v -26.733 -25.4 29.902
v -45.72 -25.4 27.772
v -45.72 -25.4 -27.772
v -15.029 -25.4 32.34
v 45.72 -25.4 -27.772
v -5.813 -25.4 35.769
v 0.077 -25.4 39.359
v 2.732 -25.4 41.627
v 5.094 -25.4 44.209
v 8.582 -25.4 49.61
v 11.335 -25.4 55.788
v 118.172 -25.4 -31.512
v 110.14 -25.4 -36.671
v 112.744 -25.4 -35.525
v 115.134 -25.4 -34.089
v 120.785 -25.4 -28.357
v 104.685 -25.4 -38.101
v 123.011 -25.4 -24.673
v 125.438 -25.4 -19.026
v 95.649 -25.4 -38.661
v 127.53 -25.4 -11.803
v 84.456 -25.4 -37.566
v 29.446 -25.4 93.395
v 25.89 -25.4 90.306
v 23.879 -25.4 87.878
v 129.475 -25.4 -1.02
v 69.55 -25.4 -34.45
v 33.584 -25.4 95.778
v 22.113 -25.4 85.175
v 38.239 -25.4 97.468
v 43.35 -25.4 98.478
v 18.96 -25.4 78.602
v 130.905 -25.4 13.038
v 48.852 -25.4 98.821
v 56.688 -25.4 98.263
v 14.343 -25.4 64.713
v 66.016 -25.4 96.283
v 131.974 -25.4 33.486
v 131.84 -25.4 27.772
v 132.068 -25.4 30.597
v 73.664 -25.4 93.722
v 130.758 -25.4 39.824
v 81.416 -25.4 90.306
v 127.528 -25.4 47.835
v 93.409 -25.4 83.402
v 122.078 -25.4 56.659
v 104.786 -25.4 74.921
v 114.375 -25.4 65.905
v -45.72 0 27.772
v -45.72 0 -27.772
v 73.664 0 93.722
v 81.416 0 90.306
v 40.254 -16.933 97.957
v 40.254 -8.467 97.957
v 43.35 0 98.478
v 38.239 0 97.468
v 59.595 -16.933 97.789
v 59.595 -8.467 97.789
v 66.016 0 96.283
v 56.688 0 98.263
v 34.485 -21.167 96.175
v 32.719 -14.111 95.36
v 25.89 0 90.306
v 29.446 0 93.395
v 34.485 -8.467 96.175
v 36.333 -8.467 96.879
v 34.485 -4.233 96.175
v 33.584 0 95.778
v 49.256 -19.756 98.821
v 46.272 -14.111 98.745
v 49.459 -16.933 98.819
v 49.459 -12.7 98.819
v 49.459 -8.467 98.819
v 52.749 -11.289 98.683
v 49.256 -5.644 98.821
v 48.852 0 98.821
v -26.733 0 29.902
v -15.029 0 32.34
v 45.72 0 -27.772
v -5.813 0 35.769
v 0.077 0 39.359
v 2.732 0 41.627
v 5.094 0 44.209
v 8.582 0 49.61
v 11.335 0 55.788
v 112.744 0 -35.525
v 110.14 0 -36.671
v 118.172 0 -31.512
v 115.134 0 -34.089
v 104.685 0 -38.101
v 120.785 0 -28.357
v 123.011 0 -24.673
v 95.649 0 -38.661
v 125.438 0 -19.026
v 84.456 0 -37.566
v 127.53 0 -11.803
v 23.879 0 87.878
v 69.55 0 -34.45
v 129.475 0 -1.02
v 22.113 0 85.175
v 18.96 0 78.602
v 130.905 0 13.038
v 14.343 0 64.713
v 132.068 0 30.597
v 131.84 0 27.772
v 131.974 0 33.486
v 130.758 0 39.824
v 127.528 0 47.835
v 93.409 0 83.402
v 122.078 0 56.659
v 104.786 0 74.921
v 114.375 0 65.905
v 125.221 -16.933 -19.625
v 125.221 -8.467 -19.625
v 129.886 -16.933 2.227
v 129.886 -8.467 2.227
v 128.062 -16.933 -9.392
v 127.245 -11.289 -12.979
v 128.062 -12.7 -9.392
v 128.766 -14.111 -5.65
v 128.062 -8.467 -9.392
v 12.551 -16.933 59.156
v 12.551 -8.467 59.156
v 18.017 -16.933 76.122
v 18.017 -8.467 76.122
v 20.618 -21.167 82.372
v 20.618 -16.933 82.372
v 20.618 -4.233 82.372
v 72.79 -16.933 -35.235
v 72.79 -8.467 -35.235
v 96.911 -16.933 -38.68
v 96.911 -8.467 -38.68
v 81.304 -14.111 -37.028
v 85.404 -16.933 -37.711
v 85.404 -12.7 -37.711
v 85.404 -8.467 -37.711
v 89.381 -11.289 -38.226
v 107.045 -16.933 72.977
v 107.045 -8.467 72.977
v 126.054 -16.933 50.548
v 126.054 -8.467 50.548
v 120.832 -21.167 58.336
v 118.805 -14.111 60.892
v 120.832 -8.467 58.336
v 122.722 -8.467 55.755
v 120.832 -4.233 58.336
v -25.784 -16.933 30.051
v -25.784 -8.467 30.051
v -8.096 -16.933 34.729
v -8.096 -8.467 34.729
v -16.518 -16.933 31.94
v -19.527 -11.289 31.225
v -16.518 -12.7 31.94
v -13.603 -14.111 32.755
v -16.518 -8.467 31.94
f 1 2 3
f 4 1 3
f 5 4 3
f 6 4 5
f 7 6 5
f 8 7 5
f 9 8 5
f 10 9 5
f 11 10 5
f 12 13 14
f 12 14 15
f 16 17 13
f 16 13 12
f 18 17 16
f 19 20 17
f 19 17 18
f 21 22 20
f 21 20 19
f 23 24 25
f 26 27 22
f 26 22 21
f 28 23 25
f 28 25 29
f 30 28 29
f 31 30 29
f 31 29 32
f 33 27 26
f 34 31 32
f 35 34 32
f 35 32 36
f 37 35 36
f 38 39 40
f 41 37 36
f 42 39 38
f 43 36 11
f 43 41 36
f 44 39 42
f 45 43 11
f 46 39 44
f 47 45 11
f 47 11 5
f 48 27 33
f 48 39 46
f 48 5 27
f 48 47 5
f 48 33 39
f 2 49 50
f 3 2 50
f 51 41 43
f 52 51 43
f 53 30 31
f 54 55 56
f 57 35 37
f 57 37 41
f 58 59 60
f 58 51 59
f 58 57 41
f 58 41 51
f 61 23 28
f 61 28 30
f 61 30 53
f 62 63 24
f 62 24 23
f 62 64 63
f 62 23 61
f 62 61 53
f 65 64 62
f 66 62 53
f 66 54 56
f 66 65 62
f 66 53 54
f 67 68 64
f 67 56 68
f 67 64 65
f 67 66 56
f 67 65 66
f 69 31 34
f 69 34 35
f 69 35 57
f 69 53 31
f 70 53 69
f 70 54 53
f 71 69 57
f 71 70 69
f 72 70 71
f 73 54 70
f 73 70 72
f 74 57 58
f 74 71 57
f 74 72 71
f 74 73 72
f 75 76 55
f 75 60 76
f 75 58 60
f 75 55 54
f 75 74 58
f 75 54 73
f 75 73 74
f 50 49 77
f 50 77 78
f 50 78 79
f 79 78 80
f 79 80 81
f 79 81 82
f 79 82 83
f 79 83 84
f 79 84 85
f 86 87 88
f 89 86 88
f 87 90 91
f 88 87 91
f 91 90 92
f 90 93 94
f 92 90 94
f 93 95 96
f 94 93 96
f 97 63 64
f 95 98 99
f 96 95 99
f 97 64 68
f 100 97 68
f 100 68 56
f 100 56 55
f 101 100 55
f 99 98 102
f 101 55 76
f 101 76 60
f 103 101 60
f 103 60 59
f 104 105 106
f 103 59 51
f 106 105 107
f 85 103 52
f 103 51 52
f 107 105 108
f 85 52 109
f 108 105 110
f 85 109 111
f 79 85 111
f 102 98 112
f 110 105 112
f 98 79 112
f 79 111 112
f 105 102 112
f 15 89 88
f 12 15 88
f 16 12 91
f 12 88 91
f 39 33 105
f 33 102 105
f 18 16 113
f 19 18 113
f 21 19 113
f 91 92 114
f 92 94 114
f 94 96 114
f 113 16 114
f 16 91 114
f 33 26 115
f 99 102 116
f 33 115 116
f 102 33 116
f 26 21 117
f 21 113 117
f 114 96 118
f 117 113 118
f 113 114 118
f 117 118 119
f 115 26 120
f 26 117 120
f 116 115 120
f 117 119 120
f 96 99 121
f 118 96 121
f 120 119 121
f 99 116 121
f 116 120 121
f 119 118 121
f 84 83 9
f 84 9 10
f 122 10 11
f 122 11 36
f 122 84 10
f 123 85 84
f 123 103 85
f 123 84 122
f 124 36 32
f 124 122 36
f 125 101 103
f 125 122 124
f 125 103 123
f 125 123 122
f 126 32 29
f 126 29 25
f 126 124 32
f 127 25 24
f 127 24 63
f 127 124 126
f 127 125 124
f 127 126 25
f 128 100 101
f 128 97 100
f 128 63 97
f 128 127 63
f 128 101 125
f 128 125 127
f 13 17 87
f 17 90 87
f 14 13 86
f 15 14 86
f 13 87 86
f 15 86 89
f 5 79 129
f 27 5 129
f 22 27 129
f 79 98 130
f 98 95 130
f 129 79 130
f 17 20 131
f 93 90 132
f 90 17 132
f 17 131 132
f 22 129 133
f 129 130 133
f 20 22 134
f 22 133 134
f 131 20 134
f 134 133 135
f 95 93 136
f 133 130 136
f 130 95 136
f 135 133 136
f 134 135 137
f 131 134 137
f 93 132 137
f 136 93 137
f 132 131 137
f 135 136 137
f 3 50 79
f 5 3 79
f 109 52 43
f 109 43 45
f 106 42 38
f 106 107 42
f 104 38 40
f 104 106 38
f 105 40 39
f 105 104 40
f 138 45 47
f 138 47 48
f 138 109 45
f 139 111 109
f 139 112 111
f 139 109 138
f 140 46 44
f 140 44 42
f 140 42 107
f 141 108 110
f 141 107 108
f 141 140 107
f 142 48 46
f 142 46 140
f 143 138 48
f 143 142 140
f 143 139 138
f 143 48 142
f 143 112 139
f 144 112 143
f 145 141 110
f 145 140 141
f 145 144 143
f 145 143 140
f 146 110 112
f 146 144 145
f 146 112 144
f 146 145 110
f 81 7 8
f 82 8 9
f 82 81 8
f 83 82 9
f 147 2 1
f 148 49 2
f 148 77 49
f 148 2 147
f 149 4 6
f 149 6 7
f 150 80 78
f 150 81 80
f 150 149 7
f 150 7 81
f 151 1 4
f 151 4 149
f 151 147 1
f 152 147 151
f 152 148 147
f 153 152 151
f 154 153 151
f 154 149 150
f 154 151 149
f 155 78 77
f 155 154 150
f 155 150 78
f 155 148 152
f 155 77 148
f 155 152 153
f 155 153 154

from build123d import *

# Parameters (mm, degrees)
F0_W     = 55.5266755181
F0_H     = 46.0978470142
F1_DEPTH = 25.4


with BuildPart() as f1:
    # F0 (on Front) → F1 (new body)
    with BuildSketch(Plane.XZ):
        Polygon((-45.72, 27.7720657421), (-45.72, -27.7720657421), (45.72, -27.7720657421), (45.72, 2.3720657421), (45.72, 27.7720657421), align=None)
        with BuildLine():
            Line((45.72, 2.3720657421), (45.72, -27.7720657421))
            add(Edge.make_bspline(
                [(131.83991611, 27.7720657421), (128.4226083131, 3.6394915706), (87.0713041565, -12.0662870858), (45.72, -27.7720657421)],
                knots=[0.7528337274, 0.7528337274, 0.7528337274, 0.7528337274, 1, 1, 1, 1], degree=3))
            add(Edge.make_bspline(
                [(81.4163490426, 90.3064464871), (108.1552290461, 77.110332117), (134.8655063082, 49.1383822136), (131.83991611, 27.7720657421)],
                knots=[0.5339995176, 0.5339995176, 0.5339995176, 0.5339995176, 0.7528337274, 0.7528337274, 0.7528337274, 0.7528337274], degree=3))
            Line((81.4163490426, 90.3064464871), (104.9052251901, 53.874658511))
            ThreePointArc((104.9052251901, 53.874658511), (101.4010974206, 18.9161297578), (70.4063948109, 2.3720657421))
            Line((70.4063948109, 2.3720657421), (45.72, 2.3720657421))
        make_face()
        with BuildLine():
            add(Edge.make_bspline(
                [(131.83991611, 27.7720657421), (128.4226083131, 3.6394915706), (87.0713041565, -12.0662870858), (45.72, -27.7720657421)],
                knots=[0.7528337274, 0.7528337274, 0.7528337274, 0.7528337274, 1, 1, 1, 1], degree=3))
            add(Edge.make_bspline(
                [(45.72, -27.7720657421), (73.2817283043, -35.9046962959), (100.8434566087, -44.0373268496), (115.1341721416, -34.0887419879)],
                knots=[0, 0, 0, 0, 0.5105148873, 0.5105148873, 0.5105148873, 0.5105148873], degree=3))
            add(Edge.make_bspline(
                [(115.1341721416, -34.0887419879), (128.8362064561, -24.5499718093), (130.3380612831, 1.6110469664), (131.83991611, 27.7720657421)],
                knots=[0.5105148873, 0.5105148873, 0.5105148873, 0.5105148873, 1, 1, 1, 1], degree=3))
        make_face()
        with BuildLine():
            add(Edge.make_bspline(
                [(-45.72, 27.7720657421), (-25.4090292575, 29.6505869851), (-5.0980585151, 31.5291082281), (5.0941300286, 44.2085994729)],
                knots=[0, 0, 0, 0, 0.1784307554, 0.1784307554, 0.1784307554, 0.1784307554], degree=3))
            Line((-45.72, 27.7720657421), (45.72, 27.7720657421))
            Line((45.72, 27.7720657421), (70.4063948109, 27.7720657421))
            ThreePointArc((70.4063948109, 27.7720657421), (80.2980419597, 33.0519371353), (81.4163490426, 44.2085994729))
            Line((81.4163490426, 44.2085994729), (25.8896735245, 44.2085994729))
            Line((25.8896735245, 44.2085994729), (5.0941300286, 44.2085994729))
        make_face()
        with BuildLine():
            Line((45.72, 27.7720657421), (45.72, 2.3720657421))
            Line((45.72, 2.3720657421), (70.4063948109, 2.3720657421))
            ThreePointArc((70.4063948109, 2.3720657421), (101.4010974206, 18.9161297578), (104.9052251901, 53.874658511))
            Line((104.9052251901, 53.874658511), (81.4163490426, 44.2085994729))
            ThreePointArc((81.4163490426, 44.2085994729), (80.2980419597, 33.0519371353), (70.4063948109, 27.7720657421))
            Line((70.4063948109, 27.7720657421), (45.72, 27.7720657421))
        make_face()
        with BuildLine():
            add(Edge.make_bspline(
                [(5.0941300286, 44.2085994729), (15.012118023, 56.5469742394), (15.3484515231, 79.1129792412), (25.8896735245, 90.3064464871)],
                knots=[0.1784307554, 0.1784307554, 0.1784307554, 0.1784307554, 0.3520611864, 0.3520611864, 0.3520611864, 0.3520611864], degree=3))
            Line((5.0941300286, 44.2085994729), (25.8896735245, 44.2085994729))
            Line((25.8896735245, 44.2085994729), (25.8896735245, 90.3064464871))
        make_face()
        with Locations((53.6530112836, 67.25752298)):
            Rectangle(F0_W, F0_H)
        Polygon((104.9052251901, 53.874658511), (81.4163490426, 90.3064464871), (81.4163490426, 44.2085994729), align=None)
        with BuildLine():
            Line((25.8896735245, 90.3064464871), (81.4163490426, 90.3064464871))
            add(Edge.make_bspline(
                [(25.8896735245, 90.3064464871), (36.9352738157, 102.0355007707), (59.185696861, 101.2776699891), (81.4163490426, 90.3064464871)],
                knots=[0.3520611864, 0.3520611864, 0.3520611864, 0.3520611864, 0.5339995176, 0.5339995176, 0.5339995176, 0.5339995176], degree=3))
        make_face()
    extrude(amount=F1_DEPTH)


solid = f1.part
